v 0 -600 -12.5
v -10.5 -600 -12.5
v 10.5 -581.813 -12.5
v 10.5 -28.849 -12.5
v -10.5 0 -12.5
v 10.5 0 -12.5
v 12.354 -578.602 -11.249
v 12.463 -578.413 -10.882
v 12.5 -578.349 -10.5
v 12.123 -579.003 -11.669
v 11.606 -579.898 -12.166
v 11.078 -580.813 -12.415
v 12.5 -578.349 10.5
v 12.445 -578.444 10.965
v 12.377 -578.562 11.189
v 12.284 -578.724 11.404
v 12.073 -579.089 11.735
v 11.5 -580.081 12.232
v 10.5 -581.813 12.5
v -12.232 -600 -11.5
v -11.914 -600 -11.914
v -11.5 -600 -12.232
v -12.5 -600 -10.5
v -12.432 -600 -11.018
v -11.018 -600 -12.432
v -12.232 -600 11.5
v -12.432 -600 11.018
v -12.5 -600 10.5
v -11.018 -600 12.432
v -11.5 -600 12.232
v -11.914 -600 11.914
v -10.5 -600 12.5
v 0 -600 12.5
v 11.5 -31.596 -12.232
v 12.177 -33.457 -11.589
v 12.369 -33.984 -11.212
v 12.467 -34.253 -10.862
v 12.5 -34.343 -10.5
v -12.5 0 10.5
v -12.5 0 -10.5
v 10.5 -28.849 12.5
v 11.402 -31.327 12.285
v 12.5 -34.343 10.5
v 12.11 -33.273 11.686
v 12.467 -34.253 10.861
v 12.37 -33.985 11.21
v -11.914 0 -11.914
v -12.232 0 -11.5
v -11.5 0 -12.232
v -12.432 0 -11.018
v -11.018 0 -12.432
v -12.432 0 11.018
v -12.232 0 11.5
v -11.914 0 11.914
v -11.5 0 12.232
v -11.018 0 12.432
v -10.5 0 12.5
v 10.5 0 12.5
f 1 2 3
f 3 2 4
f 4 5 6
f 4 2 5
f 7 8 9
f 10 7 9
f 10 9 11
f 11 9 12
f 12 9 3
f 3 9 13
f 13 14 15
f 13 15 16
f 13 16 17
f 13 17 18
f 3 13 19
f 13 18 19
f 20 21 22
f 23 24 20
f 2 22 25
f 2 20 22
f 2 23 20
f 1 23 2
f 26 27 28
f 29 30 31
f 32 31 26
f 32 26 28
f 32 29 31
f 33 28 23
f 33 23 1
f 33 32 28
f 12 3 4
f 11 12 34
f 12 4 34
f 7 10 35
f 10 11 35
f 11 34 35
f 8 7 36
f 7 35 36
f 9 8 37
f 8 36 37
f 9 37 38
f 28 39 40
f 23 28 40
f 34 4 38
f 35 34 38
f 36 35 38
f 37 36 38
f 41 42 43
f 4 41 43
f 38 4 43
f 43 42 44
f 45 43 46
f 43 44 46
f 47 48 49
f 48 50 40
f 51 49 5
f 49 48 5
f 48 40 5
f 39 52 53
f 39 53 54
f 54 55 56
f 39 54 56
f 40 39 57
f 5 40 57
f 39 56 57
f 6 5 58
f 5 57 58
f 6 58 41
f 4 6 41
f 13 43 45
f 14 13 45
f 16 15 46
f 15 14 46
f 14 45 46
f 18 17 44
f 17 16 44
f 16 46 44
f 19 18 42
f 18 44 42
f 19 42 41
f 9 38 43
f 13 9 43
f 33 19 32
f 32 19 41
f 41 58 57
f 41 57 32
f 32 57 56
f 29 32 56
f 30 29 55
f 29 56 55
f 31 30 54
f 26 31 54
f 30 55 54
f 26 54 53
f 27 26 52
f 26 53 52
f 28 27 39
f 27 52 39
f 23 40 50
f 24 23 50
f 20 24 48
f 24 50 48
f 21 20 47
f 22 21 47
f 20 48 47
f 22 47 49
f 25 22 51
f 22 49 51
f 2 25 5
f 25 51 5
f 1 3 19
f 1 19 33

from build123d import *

# Parameters (mm, degrees)
F1_DEPTH = 600
F3_DEPTH = 25.001


with BuildPart() as f1:
    # F0 (on Front) → F1 (new body)
    with BuildSketch(Plane.XZ):
        with BuildLine():
            ThreePointArc((12.5, 10.5), (11.9142135624, 11.9142135624), (10.5, 12.5))
            Line((10.5, 12.5), (-10.5, 12.5))
            ThreePointArc((-10.5, 12.5), (-11.9142135624, 11.9142135624), (-12.5, 10.5))
            Line((-12.5, 10.5), (-12.5, -10.5))
            ThreePointArc((-12.5, -10.5), (-11.9142135624, -11.9142135624), (-10.5, -12.5))
            Line((-10.5, -12.5), (10.5, -12.5))
            ThreePointArc((10.5, -12.5), (11.9142135624, -11.9142135624), (12.5, -10.5))
            Line((12.5, -10.5), (12.5, 10.5))
        make_face()
    extrude(amount=F1_DEPTH)

    # F2 (on face) → F3 (cut, through all)
    with BuildSketch(Plane.XY.offset(12.5)):
        Polygon((12.5, -34.3434677432), (12.5, 0), (10.5, 0), (10.5, -28.8485129043), align=None)
        Polygon((10.5, -600), (10.5, -581.8134665205), (0, -600), align=None)
        Polygon((12.5, -578.3493649054), (10.5, -581.8134665205), (10.5, -600), (12.5, -600), align=None)
    extrude(amount=-F3_DEPTH, mode=Mode.SUBTRACT)


solid = f1.part
